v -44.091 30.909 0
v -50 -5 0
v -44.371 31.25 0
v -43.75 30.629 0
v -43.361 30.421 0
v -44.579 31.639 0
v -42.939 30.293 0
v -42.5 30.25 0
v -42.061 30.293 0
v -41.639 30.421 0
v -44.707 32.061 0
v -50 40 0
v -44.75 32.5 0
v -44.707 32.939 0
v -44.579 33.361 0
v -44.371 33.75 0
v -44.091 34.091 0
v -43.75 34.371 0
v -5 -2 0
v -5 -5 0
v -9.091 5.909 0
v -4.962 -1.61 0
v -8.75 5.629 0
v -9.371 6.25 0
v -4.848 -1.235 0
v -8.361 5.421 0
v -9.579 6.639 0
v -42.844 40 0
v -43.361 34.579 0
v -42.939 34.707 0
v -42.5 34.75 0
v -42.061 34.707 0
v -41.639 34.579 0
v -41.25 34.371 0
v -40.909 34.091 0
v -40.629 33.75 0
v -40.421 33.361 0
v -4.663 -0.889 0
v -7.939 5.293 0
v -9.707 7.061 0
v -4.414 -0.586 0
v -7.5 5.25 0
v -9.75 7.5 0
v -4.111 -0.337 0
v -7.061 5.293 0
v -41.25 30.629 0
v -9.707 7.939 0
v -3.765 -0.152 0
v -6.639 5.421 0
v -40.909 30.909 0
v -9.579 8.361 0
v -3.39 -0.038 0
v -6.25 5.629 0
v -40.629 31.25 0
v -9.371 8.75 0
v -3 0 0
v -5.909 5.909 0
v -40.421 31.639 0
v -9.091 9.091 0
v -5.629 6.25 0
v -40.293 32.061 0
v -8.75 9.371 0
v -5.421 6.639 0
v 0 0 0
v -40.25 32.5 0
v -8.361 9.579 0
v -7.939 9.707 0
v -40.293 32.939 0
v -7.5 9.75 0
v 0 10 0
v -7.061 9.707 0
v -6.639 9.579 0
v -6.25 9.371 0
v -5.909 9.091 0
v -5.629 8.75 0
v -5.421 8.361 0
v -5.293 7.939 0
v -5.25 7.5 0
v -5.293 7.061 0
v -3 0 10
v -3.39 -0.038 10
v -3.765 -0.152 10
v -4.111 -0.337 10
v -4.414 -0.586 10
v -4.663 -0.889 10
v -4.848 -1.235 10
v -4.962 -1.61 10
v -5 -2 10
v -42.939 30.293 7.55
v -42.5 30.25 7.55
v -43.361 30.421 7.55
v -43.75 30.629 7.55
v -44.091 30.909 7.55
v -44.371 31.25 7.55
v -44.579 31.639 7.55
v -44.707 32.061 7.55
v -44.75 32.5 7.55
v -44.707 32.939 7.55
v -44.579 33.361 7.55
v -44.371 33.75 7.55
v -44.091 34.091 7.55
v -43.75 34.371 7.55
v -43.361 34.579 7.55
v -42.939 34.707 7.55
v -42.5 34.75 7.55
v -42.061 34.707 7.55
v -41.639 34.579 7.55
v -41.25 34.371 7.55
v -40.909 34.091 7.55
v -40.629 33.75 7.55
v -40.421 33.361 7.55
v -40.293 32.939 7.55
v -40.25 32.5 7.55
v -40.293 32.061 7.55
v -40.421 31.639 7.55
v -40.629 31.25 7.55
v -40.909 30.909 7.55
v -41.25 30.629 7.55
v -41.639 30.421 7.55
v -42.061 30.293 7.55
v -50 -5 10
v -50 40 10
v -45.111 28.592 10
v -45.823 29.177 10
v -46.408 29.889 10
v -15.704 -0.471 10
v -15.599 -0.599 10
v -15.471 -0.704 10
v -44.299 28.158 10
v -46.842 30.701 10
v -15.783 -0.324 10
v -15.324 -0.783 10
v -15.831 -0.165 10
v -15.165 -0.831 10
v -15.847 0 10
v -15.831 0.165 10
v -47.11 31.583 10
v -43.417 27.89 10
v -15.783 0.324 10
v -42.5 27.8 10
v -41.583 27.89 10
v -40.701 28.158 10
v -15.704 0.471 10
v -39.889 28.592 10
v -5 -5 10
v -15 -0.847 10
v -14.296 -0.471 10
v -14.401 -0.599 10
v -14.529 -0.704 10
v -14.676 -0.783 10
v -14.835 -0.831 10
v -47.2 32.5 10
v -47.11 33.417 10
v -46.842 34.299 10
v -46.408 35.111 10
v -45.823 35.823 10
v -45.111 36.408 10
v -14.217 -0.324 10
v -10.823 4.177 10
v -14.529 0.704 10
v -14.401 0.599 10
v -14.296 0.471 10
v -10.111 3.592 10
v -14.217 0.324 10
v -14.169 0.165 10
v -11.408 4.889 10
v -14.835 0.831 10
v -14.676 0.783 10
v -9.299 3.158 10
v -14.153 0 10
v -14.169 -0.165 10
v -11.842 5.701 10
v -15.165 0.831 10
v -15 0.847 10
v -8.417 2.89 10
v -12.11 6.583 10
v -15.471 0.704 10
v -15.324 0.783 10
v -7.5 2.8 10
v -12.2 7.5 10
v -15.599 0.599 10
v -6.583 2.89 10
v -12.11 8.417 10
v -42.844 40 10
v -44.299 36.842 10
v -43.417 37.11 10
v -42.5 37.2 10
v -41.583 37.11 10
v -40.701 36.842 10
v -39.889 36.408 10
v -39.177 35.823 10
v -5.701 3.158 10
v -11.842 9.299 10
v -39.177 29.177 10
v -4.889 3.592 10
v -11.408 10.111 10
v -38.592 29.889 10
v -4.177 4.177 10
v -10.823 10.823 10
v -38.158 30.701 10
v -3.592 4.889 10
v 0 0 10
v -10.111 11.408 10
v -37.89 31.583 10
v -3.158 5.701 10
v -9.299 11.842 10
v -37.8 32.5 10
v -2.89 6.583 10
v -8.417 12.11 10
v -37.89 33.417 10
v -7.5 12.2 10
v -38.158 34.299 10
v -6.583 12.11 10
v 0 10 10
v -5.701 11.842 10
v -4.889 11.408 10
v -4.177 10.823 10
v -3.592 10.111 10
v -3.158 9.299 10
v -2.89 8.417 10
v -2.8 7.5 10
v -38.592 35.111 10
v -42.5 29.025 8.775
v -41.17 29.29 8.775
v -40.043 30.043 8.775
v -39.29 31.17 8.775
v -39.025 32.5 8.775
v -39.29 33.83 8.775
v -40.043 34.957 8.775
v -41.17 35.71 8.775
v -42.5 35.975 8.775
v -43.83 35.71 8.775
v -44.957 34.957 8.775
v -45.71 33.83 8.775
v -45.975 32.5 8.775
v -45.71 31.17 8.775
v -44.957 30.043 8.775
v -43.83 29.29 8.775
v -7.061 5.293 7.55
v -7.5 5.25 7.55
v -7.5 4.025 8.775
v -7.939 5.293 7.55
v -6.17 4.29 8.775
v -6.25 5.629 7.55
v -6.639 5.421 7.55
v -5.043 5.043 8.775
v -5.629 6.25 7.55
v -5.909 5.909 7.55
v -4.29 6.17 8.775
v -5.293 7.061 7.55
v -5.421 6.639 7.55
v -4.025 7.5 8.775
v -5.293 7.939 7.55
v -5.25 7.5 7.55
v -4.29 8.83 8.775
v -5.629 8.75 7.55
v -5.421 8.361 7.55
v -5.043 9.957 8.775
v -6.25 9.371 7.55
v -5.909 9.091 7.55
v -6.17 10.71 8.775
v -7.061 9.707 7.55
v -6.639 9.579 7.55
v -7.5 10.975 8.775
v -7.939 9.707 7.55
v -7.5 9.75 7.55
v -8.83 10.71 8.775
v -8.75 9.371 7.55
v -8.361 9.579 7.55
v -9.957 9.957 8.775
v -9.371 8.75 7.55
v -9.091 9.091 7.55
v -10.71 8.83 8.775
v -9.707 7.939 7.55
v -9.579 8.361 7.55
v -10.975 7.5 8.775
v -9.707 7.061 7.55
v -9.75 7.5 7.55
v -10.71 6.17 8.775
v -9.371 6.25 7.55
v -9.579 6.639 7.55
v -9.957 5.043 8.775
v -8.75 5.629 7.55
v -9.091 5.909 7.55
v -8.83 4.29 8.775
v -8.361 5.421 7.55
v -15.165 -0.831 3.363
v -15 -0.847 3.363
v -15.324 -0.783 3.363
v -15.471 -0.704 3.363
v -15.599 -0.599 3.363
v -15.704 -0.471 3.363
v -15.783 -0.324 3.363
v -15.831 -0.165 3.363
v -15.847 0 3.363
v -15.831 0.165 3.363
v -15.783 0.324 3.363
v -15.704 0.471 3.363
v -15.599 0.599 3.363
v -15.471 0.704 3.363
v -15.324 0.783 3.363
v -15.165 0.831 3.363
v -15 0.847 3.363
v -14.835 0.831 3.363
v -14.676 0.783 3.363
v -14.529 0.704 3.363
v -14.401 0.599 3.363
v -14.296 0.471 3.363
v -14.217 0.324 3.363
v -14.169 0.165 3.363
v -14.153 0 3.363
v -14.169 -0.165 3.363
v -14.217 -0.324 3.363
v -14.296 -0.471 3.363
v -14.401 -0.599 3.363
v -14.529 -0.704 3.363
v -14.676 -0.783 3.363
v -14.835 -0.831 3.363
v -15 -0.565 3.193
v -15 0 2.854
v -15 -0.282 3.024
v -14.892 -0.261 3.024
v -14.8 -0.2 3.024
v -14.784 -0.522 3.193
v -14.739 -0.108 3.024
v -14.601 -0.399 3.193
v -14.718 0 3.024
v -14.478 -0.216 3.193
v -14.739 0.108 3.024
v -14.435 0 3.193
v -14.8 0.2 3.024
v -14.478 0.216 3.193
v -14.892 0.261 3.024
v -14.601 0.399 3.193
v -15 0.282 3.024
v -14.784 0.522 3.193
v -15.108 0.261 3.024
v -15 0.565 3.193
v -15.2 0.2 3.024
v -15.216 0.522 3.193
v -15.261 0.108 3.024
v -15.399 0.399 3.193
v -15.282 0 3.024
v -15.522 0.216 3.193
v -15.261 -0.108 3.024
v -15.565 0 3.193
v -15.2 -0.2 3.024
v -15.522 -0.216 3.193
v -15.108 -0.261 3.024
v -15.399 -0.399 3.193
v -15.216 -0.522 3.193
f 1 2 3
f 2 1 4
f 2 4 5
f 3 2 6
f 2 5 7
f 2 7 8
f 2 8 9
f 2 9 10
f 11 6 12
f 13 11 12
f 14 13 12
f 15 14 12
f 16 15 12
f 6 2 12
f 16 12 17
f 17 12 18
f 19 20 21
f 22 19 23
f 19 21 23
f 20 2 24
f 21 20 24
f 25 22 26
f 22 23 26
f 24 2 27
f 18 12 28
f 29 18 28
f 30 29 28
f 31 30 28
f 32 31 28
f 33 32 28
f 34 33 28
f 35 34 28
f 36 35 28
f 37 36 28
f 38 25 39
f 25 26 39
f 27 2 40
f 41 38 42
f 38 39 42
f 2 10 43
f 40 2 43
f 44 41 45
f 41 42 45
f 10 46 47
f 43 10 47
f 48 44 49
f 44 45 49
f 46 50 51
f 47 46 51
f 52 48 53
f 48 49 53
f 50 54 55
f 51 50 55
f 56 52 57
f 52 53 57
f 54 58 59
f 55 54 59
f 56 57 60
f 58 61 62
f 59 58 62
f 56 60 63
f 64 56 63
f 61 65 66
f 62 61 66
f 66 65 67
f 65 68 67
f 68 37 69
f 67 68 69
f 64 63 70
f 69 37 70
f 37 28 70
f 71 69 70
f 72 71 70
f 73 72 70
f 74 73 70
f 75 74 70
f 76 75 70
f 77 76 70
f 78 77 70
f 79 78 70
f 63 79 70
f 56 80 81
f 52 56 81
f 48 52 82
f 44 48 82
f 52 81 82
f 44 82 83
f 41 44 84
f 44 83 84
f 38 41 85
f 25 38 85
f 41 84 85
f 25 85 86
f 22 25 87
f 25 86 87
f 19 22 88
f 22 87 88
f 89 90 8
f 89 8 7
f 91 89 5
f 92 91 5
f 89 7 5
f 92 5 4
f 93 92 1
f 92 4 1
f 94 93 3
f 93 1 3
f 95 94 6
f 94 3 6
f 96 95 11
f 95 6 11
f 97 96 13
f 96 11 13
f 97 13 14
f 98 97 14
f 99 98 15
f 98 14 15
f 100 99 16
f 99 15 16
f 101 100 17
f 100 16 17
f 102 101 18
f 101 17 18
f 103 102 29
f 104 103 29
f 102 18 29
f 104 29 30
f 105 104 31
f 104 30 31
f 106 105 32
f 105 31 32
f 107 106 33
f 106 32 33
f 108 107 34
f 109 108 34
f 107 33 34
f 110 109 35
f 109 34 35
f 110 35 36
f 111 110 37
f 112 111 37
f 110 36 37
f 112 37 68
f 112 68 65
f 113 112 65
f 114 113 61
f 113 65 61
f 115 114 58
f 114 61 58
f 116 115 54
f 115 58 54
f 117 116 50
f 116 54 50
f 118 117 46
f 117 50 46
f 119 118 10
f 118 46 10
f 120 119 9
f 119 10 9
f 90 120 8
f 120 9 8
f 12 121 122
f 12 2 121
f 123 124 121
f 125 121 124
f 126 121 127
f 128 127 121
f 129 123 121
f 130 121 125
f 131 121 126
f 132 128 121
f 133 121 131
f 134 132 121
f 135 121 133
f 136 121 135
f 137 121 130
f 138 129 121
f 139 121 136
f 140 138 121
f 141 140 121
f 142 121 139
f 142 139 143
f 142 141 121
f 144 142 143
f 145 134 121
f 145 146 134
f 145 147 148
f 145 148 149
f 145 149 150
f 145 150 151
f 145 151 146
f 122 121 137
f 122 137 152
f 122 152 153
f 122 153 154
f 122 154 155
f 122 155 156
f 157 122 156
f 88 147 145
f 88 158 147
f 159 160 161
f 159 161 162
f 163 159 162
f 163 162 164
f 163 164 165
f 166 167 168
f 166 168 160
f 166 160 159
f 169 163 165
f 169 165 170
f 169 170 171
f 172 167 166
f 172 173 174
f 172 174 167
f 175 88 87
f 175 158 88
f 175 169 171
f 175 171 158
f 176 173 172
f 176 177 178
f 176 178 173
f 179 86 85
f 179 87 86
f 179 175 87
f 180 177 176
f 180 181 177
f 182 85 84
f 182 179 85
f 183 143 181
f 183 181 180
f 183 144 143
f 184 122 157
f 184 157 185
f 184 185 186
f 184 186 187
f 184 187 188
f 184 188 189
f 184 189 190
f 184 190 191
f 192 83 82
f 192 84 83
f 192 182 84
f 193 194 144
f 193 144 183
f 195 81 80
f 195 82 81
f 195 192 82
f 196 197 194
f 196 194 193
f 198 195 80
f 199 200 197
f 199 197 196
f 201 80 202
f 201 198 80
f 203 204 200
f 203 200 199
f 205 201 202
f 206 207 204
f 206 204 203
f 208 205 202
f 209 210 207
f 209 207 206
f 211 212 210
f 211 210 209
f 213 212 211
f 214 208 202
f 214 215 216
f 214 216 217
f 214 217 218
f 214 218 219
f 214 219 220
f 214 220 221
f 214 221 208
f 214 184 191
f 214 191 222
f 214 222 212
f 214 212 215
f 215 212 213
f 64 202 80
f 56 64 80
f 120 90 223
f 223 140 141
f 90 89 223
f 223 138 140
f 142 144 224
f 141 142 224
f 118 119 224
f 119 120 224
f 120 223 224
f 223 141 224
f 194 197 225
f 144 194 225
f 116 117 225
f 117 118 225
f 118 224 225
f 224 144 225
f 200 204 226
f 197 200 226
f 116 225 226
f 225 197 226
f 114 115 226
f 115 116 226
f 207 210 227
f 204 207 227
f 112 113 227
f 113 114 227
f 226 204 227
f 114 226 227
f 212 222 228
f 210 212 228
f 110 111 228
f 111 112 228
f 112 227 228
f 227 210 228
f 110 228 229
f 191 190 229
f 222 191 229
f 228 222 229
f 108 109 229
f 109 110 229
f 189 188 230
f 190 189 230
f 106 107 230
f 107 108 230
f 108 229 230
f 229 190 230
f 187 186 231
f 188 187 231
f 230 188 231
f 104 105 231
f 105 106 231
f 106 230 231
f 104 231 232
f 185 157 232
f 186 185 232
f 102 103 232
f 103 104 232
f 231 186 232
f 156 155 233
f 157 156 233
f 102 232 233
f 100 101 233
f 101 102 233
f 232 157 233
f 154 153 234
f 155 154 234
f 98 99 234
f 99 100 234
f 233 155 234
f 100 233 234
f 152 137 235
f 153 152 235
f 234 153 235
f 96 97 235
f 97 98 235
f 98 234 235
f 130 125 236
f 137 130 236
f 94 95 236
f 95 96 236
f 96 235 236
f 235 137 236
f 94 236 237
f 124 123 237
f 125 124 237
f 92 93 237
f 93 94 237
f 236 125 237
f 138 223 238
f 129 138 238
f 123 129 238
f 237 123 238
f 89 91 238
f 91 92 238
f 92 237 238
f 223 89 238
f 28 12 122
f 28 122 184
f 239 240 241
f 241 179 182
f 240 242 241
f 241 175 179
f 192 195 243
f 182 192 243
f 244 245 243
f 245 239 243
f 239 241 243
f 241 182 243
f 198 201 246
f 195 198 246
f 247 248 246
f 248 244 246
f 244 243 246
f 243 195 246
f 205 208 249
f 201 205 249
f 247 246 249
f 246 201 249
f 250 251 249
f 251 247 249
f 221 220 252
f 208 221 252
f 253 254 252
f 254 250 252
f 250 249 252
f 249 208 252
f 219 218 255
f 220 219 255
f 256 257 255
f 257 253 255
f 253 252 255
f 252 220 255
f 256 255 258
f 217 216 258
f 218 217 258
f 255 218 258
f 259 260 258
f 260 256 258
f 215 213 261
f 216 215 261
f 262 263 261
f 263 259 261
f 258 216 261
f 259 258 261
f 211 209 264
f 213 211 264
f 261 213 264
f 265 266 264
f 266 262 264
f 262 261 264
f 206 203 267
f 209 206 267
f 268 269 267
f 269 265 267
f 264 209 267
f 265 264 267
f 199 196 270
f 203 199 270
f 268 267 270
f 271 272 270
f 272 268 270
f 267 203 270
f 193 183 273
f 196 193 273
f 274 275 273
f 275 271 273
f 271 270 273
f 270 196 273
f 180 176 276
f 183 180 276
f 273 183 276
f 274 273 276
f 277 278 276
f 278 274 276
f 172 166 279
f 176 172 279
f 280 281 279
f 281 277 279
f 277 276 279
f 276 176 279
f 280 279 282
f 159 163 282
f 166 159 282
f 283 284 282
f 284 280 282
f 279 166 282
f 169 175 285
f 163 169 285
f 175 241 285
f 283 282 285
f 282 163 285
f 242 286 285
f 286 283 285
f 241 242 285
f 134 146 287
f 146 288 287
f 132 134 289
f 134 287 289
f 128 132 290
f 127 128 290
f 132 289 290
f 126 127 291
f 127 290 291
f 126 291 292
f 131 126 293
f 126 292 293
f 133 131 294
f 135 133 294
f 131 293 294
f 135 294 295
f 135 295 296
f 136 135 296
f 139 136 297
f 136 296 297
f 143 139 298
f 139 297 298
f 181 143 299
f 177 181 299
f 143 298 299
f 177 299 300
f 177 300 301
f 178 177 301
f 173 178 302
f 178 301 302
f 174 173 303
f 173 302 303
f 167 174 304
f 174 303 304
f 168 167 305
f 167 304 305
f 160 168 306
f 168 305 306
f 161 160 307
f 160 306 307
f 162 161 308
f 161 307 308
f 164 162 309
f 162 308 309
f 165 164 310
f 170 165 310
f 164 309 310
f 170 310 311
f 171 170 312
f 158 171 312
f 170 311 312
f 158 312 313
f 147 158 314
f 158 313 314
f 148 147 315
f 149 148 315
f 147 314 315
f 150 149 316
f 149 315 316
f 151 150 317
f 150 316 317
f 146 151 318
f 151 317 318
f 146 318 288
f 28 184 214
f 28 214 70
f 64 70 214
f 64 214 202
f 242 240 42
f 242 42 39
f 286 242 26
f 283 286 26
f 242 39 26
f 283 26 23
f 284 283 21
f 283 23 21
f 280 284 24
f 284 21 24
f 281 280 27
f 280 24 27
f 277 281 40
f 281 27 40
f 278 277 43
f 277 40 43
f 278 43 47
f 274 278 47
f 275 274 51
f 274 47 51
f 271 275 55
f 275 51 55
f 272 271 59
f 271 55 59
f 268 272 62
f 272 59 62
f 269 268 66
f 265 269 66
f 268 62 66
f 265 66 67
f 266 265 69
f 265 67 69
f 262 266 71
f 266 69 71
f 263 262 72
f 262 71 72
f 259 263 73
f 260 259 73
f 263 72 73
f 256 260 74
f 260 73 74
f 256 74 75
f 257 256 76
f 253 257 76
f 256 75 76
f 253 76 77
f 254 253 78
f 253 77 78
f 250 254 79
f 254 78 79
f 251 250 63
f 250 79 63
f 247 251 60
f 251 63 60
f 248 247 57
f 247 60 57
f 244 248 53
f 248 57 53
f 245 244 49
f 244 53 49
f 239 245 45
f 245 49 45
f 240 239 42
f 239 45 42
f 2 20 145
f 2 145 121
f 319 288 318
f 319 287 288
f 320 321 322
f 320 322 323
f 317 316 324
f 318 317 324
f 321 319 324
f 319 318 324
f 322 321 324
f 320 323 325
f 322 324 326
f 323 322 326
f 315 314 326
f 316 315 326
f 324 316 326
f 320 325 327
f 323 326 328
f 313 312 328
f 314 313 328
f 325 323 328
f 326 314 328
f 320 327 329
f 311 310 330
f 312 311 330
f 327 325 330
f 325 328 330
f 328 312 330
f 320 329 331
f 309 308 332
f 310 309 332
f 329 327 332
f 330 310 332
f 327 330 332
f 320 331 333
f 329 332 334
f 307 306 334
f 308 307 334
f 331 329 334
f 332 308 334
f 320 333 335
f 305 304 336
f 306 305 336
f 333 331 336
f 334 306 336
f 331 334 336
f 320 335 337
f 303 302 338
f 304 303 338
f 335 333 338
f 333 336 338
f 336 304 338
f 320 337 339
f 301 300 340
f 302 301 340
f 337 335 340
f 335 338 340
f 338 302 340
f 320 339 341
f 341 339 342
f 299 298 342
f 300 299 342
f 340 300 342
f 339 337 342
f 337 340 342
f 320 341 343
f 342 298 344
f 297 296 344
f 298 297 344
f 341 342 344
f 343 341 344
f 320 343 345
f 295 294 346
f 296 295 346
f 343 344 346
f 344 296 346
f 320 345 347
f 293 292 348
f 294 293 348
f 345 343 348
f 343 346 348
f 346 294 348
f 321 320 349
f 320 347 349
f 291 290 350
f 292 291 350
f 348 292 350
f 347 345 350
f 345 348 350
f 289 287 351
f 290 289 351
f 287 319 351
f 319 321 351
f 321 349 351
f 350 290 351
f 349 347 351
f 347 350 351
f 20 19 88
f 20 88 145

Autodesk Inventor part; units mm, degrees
ref_plane "YZ Plane" through (0, 0, 0) normal (1, 0, 0) x (0, 1, 0)
ref_plane "XZ Plane" through (0, 0, 0) normal (0, 1, 0) x (-1, 0, 0)
ref_plane "XY Plane" through (0, 0, 0) normal (0, 0, 1) x (1, 0, 0)
sketch "Sketch1" plane through (0, 0, 0) normal (0, 0, 1) x (1, 0, 0)
  line L0 (0, 0) -> (-50, 0)
  line L1 (-50, 40) -> (0, 40)
  line L2 (0, 40) -> (0, 0)
  line L3 (-50, 0) -> (-50, 40)
  line L4 (-50, 0) -> (-5, 0)
  line L5 (-5, 0) -> (-5, -5)
  line L6 (-5, -5) -> (-50, -5)
  line L7 (-50, -5) -> (-50, 0)
  dimension "d1" = 40
  dimension "d2" = 50
  dimension "d20" = 5
  dimension "d21" = 5
extrude "Extrusion1" add sketch "Sketch1" along normal blind 10
sketch "Sketch2" plane through (0, 0, 10) normal (0, 0, 1) x (1, 0, 0)
  line L0 (0, 40) -> (-50, 40) projected
  line L1 (0, 0) -> (0, 40) projected
  line L2 (-5, 0) -> (0, 0) projected
  line L3 (-50, 40) -> (-50, -5) projected
  point P0 (-42.5, 32.5)
  point P1 (-7.5, 7.5)
  point P2 (-50, 0)
  dimension "d5" = 7.5
  dimension "d7" = 7.5
  dimension "d15" = 7.5
  dimension "d16" = 7.5
hole "Hole1" at (-42.5, 32.5, 10) at (-7.5, 7.5, 10) direction (0, 0, -1) diameter 4.5 end through all countersink diameter 9.4 countersink angle 90 clearance for "Flat Head Machine Screw" size "M4" standard "Ansi Metric M Profile"
chamfer "Chamfer1" distance 30 angle 55 1 edges at (0, 40, 5) measured on face at (0, 26.6667, 3.3333)
fillet "Fillet1" radius 2 1 edges at (-5, 0, 5)
sketch "Sketch3" plane through (0, 0, 10) normal (0, 0, 1) x (1, 0, 0)
  line L0 (-50, -5) -> (-5, -5) projected
  line L1 (0, 0) -> (0, 10) projected
  point P0 (-15, 0)
  dimension "d23" = 5
  dimension "d24" = 15
hole "Hole2" at (-15, 0, 10) direction (0, 0, -1) diameter 1.694 depth 6.637 tip angle 118 thread size "2-56 UNC" class "2B" standard "ANSI Unified Screw Threads"
equation "\"d7\" = d5"
equation "\"d15\" = d16"
properties part number "Pancake_Side Piece Short" material "Wood (Birch)"
